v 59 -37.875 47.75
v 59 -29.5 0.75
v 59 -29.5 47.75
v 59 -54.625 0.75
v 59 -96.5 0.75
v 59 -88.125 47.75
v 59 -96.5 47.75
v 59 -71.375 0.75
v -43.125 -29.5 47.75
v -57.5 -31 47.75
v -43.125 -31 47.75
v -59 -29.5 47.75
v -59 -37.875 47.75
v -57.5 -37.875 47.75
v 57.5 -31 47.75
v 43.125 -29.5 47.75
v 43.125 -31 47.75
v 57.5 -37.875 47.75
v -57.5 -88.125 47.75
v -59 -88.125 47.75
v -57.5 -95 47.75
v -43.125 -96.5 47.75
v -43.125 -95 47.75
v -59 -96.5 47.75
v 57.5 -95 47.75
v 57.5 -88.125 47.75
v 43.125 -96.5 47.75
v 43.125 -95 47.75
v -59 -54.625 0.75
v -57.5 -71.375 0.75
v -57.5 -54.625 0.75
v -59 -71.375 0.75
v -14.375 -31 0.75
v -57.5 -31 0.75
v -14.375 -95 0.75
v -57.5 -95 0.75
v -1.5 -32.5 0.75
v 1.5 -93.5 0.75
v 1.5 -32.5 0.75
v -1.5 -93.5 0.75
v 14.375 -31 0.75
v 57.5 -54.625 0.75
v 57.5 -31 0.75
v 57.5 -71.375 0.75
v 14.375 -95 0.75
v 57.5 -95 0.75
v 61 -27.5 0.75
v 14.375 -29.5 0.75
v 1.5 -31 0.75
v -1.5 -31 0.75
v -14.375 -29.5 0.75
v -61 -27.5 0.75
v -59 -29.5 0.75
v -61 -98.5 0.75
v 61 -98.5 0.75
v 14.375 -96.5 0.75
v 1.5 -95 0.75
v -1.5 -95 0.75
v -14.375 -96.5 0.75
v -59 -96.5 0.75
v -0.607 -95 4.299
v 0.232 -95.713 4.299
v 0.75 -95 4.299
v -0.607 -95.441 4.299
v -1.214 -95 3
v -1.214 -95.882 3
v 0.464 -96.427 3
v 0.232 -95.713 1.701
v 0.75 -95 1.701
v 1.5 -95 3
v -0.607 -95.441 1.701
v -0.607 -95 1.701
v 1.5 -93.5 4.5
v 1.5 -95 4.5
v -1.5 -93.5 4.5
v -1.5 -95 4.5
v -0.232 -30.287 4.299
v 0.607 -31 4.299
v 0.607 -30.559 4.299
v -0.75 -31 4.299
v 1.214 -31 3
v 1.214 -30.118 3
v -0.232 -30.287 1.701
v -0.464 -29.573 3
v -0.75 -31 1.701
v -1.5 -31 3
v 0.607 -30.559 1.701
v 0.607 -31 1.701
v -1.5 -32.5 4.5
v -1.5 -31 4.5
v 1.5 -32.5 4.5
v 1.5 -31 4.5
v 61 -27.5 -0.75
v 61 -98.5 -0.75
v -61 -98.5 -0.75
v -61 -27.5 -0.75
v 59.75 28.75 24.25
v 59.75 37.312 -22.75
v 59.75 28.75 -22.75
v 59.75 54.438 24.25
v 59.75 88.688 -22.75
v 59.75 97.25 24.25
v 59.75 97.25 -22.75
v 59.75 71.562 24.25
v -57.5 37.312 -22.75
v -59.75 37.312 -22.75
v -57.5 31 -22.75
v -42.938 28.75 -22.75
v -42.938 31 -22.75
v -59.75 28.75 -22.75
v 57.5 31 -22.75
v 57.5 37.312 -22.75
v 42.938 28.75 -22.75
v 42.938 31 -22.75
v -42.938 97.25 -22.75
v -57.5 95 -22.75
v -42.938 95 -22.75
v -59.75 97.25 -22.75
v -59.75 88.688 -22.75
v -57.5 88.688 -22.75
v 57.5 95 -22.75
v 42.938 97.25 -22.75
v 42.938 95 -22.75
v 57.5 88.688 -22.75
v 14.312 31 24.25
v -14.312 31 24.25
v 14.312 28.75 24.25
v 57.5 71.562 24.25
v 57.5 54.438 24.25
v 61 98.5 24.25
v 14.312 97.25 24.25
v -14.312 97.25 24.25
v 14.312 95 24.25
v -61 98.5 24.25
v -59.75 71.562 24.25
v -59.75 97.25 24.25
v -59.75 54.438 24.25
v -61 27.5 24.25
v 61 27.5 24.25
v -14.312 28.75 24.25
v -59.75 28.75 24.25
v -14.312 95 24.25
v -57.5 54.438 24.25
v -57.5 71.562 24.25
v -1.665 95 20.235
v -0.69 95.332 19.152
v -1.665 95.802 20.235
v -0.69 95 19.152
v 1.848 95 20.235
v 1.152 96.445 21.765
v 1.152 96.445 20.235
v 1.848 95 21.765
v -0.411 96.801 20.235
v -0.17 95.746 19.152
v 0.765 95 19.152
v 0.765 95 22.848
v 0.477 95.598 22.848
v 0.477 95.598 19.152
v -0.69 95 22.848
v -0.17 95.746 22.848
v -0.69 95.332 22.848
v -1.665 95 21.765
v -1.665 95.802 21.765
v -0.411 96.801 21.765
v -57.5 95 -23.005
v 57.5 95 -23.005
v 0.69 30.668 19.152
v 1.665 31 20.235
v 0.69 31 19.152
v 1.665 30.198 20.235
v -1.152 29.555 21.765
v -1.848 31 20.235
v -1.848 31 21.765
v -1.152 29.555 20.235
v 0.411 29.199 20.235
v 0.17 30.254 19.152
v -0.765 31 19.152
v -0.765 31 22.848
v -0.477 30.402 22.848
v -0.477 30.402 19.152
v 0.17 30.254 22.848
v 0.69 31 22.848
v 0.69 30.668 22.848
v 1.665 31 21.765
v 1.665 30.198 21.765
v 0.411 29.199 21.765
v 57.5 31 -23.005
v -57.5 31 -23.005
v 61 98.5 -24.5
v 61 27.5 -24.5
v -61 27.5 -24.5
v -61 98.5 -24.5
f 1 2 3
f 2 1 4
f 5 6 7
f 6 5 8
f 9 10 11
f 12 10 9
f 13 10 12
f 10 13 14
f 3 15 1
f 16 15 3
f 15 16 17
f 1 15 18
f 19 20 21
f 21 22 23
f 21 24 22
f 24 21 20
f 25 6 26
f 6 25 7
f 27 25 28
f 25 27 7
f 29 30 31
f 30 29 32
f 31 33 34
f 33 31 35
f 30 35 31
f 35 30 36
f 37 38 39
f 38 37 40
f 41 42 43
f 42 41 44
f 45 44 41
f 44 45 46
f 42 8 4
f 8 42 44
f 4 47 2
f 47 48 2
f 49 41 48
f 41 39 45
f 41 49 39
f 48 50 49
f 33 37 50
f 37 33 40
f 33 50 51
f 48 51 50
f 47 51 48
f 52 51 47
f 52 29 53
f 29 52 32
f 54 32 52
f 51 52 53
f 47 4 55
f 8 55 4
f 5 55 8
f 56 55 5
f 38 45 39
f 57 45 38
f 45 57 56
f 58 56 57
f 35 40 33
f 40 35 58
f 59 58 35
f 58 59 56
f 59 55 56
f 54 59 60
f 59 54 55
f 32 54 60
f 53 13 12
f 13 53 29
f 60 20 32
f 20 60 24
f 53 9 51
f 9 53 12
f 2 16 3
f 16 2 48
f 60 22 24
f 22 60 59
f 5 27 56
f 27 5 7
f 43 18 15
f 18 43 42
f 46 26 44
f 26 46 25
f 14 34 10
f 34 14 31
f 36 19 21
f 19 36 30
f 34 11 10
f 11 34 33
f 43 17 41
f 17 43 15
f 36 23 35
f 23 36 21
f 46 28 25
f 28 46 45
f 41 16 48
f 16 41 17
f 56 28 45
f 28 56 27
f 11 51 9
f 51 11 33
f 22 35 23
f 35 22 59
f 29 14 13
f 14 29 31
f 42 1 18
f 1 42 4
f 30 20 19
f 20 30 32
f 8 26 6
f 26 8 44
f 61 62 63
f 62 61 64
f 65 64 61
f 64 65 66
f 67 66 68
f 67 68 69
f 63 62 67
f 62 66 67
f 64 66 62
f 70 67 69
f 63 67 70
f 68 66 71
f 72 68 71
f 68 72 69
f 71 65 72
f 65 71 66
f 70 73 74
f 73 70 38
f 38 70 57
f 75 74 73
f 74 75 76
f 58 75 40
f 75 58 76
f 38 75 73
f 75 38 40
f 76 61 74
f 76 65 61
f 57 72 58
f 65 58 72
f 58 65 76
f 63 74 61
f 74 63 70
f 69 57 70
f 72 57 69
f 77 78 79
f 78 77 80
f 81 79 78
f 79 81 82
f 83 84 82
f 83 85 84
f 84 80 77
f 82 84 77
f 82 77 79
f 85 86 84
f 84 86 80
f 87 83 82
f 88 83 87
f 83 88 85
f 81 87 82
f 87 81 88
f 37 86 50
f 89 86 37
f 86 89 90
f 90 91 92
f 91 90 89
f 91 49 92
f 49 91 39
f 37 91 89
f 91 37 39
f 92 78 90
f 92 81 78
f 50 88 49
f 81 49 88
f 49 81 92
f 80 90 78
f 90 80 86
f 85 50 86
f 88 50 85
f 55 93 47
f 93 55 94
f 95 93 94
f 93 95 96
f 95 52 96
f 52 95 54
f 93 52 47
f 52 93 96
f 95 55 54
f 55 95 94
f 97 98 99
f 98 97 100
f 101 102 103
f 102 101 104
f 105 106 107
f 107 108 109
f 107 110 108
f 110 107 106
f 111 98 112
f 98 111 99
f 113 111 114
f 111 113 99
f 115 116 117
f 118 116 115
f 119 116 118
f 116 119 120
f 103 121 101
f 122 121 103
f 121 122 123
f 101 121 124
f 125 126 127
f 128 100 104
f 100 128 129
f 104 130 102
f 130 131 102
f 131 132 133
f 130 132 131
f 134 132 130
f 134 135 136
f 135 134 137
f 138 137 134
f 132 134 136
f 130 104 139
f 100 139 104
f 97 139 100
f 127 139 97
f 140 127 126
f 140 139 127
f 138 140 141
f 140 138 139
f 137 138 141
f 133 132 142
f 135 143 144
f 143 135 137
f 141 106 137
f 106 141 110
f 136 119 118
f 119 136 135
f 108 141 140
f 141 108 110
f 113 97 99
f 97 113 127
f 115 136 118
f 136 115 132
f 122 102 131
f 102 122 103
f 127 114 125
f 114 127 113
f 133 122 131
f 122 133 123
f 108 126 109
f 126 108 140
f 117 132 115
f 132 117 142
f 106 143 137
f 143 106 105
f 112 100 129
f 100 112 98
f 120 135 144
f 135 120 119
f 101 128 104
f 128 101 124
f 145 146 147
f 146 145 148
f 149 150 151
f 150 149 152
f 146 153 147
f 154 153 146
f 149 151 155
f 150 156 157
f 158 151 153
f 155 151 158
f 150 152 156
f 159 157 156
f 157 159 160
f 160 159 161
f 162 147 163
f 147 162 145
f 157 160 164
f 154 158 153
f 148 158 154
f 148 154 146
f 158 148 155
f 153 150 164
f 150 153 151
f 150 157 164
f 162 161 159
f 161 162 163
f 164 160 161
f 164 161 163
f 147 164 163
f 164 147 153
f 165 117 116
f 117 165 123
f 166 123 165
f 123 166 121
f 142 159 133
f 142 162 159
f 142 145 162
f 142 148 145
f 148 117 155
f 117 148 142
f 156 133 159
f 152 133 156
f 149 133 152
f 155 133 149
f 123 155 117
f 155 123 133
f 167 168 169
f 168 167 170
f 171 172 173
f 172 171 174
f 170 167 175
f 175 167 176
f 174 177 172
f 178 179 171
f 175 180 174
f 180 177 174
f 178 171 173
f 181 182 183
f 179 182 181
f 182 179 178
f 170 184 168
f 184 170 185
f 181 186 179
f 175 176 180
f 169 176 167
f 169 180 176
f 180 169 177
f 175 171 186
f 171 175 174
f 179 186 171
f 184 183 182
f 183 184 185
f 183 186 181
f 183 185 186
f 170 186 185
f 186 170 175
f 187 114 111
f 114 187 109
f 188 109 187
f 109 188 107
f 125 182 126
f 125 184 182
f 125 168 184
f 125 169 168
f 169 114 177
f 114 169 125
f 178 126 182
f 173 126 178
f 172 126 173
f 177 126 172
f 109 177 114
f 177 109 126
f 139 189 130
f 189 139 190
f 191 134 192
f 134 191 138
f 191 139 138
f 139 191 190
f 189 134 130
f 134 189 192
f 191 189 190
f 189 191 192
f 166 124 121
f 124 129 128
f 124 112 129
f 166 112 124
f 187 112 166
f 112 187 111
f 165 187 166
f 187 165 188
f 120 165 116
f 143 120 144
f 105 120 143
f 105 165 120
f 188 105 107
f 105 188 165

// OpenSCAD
longueur_carte = 114;
largeur_carte = 63;
epaisseur_carte = 0.5;
nb_cartes = 94;
hauteur_cartes = epaisseur_carte*nb_cartes;
epaisseur = 1.5;
marge = 0.5;
manifold = 0.01;

module bloc_carte(longueur_carte, largeur_carte, hauteur_bloc, epaisseur){
	difference(){
		cube([longueur_carte+2*epaisseur, largeur_carte+2*epaisseur, hauteur_bloc], center=true);
		cube([longueur_carte, largeur_carte, 2*hauteur_bloc], center=true);
		triangle_decoupe(largeur_carte+3*epaisseur, longueur_carte, 2*hauteur_bloc);
		rotate([0,0,90]) triangle_decoupe(longueur_carte+3*epaisseur, largeur_carte+2*epaisseur, 2*hauteur_bloc);
	}
}

module triangle_decoupe(longueur, largeur, hauteur){
	translate([-largeur/2,0,hauteur/2])rotate([-90,0,0]) linear_extrude(height=longueur, center=true) polygon(points=[[0,0],[largeur,0],[largeur/2,hauteur]], paths=[[0,1,2]]);
}

module bloc_verrou(longueur_carte, largeur_carte, epaisseur){
	translate([0,-largeur_carte/2,0]) verrou(epaisseur);
	translate([0,largeur_carte/2,0]) rotate([0,0,180])verrou(epaisseur);
}

module verrou(epaisseur){
	translate([0,0, 2*epaisseur]) sphere(epaisseur);
	translate([0,epaisseur/2, 3*epaisseur/2])cube([2*epaisseur, epaisseur, 3*epaisseur], center=true);
}

module base(){
	cube([longueur_carte+4*marge+4*epaisseur, largeur_carte+4*marge+4*epaisseur, epaisseur], center=true);
	translate([0,0,(hauteur_cartes+epaisseur)/2])bloc_carte(longueur_carte+2*marge, largeur_carte+2*marge, hauteur_cartes, epaisseur);	
	bloc_verrou(longueur_carte+2*marge, largeur_carte+2*marge, epaisseur);
}

module base_negative(){
	cube([longueur_carte+4*marge+4*epaisseur, largeur_carte+4*marge+4*epaisseur, epaisseur], center=true);
	translate([0,0,(hauteur_cartes+epaisseur)/2])bloc_carte(longueur_carte+marge, largeur_carte+marge, hauteur_cartes, epaisseur+2*marge);	
	bloc_verrou(longueur_carte+2*marge, largeur_carte+2*marge, epaisseur+marge);
}

module couvercle(){
	difference(){
		cube([longueur_carte+4*marge+4*epaisseur, largeur_carte+4*marge+4*epaisseur, hauteur_cartes+epaisseur+marge], center=true);
		translate([0,0,epaisseur/2]) cube([longueur_carte+2*marge, largeur_carte+2*marge, hauteur_cartes+manifold+marge], center=true);
		translate([0,0,hauteur_cartes/2+epaisseur]) rotate([180,0,0]) color("green") base_negative();	
	}
}

translate([0,-largeur_carte,0]) color("blue") base();
translate([0,+largeur_carte,0]) color("red") couvercle();
